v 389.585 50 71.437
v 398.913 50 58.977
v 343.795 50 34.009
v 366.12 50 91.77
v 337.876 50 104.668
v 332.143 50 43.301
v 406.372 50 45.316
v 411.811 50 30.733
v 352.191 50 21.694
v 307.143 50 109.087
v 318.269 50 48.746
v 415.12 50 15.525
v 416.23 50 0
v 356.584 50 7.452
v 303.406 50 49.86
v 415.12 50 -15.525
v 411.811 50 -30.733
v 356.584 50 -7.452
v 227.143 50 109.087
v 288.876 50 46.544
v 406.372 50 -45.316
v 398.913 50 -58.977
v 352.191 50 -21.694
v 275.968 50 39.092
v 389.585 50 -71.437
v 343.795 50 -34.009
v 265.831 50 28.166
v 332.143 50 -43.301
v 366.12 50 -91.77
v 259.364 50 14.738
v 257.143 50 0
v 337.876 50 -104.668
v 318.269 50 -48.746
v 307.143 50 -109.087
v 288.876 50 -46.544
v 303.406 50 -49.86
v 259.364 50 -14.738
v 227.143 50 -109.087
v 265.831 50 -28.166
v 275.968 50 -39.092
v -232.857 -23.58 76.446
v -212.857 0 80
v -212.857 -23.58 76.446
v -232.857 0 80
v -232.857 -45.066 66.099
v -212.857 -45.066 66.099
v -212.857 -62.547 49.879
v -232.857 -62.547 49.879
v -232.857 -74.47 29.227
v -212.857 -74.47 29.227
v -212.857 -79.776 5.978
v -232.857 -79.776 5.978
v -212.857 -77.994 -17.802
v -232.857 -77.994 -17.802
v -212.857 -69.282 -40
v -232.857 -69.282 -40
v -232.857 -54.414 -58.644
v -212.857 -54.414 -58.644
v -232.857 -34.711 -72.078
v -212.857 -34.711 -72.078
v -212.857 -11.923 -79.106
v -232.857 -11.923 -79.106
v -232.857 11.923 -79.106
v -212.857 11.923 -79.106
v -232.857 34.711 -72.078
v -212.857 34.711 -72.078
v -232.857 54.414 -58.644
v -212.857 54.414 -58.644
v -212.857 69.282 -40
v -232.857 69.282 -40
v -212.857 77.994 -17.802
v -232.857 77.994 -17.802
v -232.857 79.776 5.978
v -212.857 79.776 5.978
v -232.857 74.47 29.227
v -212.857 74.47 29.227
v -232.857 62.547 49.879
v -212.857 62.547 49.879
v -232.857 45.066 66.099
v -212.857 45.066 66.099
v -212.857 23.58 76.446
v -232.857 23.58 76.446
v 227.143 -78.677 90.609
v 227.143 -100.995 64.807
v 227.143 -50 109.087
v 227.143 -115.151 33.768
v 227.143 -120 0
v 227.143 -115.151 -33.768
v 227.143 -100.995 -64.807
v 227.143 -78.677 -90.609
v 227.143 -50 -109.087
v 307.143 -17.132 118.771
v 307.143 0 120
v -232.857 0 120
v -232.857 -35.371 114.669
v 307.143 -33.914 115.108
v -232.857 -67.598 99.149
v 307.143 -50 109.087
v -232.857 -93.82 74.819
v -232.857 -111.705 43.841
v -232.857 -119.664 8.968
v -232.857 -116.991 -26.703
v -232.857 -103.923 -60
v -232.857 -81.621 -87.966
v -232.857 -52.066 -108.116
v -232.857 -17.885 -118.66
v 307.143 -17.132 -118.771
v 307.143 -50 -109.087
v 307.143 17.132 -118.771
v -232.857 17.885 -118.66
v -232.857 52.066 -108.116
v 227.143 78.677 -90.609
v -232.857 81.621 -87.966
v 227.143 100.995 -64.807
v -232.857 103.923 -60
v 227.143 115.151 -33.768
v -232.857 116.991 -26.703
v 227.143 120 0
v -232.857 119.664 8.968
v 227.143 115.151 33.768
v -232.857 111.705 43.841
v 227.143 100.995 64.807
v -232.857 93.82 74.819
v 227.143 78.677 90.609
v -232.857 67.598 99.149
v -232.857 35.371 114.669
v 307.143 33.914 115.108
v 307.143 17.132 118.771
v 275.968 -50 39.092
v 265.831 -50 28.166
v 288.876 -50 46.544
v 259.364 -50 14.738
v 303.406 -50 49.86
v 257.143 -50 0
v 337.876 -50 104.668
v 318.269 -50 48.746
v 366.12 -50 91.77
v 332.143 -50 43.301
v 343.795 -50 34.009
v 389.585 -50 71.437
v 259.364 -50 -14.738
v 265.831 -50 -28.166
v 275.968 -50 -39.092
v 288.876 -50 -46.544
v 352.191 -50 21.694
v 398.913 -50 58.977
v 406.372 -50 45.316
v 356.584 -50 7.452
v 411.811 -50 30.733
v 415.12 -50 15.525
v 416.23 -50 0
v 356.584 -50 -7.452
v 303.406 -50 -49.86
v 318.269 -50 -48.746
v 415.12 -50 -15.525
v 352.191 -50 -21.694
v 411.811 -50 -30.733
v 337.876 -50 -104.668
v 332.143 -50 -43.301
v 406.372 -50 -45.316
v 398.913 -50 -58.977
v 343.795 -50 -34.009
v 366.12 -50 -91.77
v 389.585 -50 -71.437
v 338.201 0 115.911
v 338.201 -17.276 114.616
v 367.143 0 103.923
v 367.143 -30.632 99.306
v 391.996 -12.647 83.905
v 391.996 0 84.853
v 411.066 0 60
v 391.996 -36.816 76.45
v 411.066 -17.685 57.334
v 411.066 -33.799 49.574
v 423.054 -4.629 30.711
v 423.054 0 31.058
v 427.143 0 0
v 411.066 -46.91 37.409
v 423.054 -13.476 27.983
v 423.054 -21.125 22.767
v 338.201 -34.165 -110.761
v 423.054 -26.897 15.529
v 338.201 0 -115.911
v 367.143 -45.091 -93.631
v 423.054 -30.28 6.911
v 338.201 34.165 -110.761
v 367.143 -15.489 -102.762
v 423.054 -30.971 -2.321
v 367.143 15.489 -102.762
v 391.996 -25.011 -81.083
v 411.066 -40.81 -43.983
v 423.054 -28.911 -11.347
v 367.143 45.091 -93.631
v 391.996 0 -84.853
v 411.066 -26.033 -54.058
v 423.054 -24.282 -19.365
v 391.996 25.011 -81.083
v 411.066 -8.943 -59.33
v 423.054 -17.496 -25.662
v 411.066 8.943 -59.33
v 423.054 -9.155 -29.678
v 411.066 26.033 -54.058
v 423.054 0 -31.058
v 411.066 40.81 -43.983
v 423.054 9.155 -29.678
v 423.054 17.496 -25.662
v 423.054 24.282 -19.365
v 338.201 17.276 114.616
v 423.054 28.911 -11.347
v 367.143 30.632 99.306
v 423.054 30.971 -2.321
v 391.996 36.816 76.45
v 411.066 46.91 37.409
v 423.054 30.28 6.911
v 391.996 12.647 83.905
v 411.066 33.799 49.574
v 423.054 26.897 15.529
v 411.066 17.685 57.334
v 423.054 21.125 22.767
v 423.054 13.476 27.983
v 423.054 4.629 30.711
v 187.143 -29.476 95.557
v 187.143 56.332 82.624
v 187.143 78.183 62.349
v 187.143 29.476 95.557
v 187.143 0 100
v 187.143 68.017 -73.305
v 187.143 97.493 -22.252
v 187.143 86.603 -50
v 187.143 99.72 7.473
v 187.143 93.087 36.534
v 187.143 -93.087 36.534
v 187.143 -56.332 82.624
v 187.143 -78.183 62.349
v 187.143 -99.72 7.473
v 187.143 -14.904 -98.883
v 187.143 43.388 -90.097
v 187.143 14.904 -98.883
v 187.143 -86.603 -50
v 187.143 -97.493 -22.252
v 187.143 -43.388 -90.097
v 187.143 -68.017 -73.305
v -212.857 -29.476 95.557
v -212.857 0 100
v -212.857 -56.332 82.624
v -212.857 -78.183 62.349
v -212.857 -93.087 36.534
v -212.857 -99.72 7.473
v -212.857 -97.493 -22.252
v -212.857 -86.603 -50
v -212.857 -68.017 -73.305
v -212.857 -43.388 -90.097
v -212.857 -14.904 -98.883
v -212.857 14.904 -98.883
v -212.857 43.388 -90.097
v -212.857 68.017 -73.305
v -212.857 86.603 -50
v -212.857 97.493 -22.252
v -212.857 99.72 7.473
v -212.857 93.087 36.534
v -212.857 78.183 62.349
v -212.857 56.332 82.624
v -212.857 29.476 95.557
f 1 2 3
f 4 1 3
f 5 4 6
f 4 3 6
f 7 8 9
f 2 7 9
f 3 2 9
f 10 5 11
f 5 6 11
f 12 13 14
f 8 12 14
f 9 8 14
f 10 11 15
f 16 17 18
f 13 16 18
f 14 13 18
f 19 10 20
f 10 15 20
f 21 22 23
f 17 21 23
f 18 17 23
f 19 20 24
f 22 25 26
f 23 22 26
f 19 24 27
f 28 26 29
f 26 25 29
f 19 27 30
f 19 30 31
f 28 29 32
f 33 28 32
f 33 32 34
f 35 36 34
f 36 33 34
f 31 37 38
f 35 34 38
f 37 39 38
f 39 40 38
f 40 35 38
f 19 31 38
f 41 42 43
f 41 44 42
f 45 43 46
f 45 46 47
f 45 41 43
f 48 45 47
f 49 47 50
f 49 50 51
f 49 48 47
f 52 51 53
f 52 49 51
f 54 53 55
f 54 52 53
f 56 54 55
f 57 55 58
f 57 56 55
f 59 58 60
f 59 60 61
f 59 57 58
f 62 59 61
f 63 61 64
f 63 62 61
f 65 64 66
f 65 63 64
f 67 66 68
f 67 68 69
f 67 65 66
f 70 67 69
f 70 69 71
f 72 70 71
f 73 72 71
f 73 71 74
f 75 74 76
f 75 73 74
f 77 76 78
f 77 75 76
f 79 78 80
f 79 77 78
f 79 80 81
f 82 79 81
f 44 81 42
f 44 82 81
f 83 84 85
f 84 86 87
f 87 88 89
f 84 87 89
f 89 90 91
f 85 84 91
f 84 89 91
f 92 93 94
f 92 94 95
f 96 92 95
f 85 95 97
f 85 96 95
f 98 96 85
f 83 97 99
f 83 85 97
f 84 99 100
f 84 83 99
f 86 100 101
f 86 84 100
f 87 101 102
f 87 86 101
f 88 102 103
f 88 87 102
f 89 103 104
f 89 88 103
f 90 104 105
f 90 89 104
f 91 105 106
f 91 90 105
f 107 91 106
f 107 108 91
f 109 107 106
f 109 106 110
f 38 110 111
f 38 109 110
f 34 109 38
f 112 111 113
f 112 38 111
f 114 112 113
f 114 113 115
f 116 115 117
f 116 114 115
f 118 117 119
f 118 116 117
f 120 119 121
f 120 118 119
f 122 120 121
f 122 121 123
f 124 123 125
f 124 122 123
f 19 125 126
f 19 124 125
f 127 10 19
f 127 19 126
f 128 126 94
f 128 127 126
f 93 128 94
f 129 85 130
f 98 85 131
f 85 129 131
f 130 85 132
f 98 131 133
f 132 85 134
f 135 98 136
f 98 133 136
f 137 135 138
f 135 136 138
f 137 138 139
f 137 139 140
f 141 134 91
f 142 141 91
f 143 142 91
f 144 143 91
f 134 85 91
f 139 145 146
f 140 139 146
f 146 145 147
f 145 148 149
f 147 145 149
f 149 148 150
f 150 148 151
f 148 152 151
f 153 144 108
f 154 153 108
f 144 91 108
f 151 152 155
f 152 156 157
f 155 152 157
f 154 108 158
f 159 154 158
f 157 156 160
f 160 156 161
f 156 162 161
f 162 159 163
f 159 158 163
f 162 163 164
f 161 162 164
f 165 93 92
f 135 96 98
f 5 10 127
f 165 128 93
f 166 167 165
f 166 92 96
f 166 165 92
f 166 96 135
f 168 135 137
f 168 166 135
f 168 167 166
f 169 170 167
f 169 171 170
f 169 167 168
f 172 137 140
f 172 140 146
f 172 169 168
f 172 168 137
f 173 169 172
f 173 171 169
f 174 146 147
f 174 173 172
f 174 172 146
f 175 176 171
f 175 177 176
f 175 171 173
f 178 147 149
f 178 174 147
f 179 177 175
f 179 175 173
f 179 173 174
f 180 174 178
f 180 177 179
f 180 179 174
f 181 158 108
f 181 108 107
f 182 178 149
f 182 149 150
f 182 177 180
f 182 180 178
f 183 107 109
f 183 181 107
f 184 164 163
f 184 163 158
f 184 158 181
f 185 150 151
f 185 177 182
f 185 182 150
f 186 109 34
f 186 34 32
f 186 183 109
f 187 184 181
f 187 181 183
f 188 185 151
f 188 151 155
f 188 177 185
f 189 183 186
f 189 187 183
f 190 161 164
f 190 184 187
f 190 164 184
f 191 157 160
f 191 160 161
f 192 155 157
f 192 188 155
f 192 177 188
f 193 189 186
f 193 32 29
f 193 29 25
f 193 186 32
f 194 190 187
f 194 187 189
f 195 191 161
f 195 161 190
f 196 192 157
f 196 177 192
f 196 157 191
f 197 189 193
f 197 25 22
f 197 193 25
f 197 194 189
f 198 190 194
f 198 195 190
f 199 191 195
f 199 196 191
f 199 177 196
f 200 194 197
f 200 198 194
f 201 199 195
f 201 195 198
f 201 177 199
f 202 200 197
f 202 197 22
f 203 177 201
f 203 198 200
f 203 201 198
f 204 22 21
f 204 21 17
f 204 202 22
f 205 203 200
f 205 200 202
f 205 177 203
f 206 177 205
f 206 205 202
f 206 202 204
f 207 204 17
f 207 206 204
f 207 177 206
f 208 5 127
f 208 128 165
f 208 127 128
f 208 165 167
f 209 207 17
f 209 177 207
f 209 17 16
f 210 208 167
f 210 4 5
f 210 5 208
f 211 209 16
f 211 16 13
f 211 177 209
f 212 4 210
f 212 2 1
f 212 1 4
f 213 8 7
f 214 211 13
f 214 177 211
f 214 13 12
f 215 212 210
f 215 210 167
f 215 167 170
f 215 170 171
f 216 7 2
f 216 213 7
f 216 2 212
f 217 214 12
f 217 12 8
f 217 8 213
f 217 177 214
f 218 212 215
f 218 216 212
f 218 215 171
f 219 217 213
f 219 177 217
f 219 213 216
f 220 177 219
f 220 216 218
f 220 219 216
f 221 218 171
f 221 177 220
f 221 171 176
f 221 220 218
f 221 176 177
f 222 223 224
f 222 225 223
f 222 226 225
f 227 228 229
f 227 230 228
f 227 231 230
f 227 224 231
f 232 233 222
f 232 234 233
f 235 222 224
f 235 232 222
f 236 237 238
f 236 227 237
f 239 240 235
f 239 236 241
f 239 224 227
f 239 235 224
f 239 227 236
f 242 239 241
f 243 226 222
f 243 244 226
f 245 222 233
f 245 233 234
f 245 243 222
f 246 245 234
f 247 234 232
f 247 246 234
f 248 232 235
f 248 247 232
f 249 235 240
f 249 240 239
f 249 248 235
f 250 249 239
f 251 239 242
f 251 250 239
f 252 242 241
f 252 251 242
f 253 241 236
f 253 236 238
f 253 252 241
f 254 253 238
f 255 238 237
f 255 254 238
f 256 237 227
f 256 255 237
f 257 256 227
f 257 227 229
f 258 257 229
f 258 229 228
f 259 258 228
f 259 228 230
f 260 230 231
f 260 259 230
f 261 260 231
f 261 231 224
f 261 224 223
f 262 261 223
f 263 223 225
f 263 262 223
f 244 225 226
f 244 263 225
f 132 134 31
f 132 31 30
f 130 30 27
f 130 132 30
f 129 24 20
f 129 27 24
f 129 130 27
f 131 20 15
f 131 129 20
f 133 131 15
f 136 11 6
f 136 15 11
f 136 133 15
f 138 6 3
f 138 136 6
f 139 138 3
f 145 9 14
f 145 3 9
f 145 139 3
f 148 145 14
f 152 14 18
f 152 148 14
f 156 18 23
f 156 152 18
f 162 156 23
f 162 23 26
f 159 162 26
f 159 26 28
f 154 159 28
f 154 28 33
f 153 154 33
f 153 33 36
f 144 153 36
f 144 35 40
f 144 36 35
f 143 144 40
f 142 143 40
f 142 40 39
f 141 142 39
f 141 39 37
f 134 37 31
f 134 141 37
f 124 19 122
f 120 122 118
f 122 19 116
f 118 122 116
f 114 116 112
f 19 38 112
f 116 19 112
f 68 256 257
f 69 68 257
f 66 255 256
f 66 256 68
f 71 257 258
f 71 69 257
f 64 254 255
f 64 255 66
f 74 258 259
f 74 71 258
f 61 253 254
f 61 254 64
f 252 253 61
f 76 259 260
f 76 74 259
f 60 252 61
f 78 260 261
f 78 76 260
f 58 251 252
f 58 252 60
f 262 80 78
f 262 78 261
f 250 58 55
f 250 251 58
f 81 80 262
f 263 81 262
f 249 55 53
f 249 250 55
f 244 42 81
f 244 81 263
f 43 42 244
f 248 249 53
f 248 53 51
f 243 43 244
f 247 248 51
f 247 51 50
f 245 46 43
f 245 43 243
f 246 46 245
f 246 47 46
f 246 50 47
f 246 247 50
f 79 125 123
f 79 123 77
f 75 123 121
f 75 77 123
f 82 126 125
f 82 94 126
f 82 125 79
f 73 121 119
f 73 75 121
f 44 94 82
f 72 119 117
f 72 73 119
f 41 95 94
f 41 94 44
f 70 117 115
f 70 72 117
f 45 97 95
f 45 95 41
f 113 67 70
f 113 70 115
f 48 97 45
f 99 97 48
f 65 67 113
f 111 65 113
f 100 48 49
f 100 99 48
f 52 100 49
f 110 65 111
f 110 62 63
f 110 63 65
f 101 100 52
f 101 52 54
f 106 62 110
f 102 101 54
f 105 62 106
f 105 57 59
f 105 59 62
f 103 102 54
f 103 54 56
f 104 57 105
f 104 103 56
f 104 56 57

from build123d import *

# Parameters (mm, degrees)
CUT_EXTRUDE2_DEPTH      = 460.620517828
CUT_EXTRUDE2_DEPTH_BACK = 460.620517828
CUT_EXTRUDE3_DEPTH      = 476.132634543
CUT_EXTRUDE3_DEPTH_BACK = 476.132634543
SKETCH3_R               = 50


with BuildPart() as part:
    # Sketch1 → Revolve1 (revolve)
    with BuildSketch(Plane(origin=(0, 0, 0), x_dir=(1, 0, 0), z_dir=(0, 1, 0)), mode=Mode.PRIVATE) as revolve1_sk:
        with BuildLine():
            Line((-212.857142857, 80), (-232.857142857, 80))
            Line((-232.857142857, 80), (-232.857142857, 120))
            Line((-232.857142857, 120), (307.142857143, 120))
            ThreePointArc((307.142857143, 120), (391.995670885, 84.852813742), (427.142857143, 0))
            Line((427.142857143, 0), (307.142857143, 0))
            Line((307.142857143, 0), (187.142857143, 0))
            Line((187.142857143, 0), (187.142857143, 100))
            Line((187.142857143, 100), (-212.857142857, 100))
            Line((-212.857142857, 100), (-212.857142857, 80))
        make_face()
    revolve(revolve1_sk.sketch.rotate(Axis((-156.292678098, 0, 0), (1, 0, 0)), 180), axis=Axis((-156.292678098, 0, 0), (1, 0, 0)))

    # Sketch2 → Cut-Extrude2 (cut, two sides: drawn at the far end of the back side and taken through both)
    with BuildSketch(Plane.XY.offset(-CUT_EXTRUDE2_DEPTH_BACK)):
        Polygon((525.404105683, 50), (227.142857143, 50), (227.142857143, 120), (587.948795726, 120), (587.948795726, -120), (227.142857143, -120), (227.142857143, -50), (525.404105683, -50), align=None)
    extrude(amount=CUT_EXTRUDE2_DEPTH + CUT_EXTRUDE2_DEPTH_BACK, mode=Mode.SUBTRACT)

    # Sketch3 → Cut-Extrude3 (cut, two sides: drawn at the far end of the back side and taken through both)
    with BuildSketch(Plane(origin=(0, 50, 0), x_dir=(1, 0, 0), z_dir=(0, 1, 0)).offset(-CUT_EXTRUDE3_DEPTH_BACK)):
        with Locations(Location((307.142857143, 0, 0), (0, 0, 180))):
            Circle(SKETCH3_R)
    extrude(amount=CUT_EXTRUDE3_DEPTH + CUT_EXTRUDE3_DEPTH_BACK, mode=Mode.SUBTRACT)


solid = part.part
